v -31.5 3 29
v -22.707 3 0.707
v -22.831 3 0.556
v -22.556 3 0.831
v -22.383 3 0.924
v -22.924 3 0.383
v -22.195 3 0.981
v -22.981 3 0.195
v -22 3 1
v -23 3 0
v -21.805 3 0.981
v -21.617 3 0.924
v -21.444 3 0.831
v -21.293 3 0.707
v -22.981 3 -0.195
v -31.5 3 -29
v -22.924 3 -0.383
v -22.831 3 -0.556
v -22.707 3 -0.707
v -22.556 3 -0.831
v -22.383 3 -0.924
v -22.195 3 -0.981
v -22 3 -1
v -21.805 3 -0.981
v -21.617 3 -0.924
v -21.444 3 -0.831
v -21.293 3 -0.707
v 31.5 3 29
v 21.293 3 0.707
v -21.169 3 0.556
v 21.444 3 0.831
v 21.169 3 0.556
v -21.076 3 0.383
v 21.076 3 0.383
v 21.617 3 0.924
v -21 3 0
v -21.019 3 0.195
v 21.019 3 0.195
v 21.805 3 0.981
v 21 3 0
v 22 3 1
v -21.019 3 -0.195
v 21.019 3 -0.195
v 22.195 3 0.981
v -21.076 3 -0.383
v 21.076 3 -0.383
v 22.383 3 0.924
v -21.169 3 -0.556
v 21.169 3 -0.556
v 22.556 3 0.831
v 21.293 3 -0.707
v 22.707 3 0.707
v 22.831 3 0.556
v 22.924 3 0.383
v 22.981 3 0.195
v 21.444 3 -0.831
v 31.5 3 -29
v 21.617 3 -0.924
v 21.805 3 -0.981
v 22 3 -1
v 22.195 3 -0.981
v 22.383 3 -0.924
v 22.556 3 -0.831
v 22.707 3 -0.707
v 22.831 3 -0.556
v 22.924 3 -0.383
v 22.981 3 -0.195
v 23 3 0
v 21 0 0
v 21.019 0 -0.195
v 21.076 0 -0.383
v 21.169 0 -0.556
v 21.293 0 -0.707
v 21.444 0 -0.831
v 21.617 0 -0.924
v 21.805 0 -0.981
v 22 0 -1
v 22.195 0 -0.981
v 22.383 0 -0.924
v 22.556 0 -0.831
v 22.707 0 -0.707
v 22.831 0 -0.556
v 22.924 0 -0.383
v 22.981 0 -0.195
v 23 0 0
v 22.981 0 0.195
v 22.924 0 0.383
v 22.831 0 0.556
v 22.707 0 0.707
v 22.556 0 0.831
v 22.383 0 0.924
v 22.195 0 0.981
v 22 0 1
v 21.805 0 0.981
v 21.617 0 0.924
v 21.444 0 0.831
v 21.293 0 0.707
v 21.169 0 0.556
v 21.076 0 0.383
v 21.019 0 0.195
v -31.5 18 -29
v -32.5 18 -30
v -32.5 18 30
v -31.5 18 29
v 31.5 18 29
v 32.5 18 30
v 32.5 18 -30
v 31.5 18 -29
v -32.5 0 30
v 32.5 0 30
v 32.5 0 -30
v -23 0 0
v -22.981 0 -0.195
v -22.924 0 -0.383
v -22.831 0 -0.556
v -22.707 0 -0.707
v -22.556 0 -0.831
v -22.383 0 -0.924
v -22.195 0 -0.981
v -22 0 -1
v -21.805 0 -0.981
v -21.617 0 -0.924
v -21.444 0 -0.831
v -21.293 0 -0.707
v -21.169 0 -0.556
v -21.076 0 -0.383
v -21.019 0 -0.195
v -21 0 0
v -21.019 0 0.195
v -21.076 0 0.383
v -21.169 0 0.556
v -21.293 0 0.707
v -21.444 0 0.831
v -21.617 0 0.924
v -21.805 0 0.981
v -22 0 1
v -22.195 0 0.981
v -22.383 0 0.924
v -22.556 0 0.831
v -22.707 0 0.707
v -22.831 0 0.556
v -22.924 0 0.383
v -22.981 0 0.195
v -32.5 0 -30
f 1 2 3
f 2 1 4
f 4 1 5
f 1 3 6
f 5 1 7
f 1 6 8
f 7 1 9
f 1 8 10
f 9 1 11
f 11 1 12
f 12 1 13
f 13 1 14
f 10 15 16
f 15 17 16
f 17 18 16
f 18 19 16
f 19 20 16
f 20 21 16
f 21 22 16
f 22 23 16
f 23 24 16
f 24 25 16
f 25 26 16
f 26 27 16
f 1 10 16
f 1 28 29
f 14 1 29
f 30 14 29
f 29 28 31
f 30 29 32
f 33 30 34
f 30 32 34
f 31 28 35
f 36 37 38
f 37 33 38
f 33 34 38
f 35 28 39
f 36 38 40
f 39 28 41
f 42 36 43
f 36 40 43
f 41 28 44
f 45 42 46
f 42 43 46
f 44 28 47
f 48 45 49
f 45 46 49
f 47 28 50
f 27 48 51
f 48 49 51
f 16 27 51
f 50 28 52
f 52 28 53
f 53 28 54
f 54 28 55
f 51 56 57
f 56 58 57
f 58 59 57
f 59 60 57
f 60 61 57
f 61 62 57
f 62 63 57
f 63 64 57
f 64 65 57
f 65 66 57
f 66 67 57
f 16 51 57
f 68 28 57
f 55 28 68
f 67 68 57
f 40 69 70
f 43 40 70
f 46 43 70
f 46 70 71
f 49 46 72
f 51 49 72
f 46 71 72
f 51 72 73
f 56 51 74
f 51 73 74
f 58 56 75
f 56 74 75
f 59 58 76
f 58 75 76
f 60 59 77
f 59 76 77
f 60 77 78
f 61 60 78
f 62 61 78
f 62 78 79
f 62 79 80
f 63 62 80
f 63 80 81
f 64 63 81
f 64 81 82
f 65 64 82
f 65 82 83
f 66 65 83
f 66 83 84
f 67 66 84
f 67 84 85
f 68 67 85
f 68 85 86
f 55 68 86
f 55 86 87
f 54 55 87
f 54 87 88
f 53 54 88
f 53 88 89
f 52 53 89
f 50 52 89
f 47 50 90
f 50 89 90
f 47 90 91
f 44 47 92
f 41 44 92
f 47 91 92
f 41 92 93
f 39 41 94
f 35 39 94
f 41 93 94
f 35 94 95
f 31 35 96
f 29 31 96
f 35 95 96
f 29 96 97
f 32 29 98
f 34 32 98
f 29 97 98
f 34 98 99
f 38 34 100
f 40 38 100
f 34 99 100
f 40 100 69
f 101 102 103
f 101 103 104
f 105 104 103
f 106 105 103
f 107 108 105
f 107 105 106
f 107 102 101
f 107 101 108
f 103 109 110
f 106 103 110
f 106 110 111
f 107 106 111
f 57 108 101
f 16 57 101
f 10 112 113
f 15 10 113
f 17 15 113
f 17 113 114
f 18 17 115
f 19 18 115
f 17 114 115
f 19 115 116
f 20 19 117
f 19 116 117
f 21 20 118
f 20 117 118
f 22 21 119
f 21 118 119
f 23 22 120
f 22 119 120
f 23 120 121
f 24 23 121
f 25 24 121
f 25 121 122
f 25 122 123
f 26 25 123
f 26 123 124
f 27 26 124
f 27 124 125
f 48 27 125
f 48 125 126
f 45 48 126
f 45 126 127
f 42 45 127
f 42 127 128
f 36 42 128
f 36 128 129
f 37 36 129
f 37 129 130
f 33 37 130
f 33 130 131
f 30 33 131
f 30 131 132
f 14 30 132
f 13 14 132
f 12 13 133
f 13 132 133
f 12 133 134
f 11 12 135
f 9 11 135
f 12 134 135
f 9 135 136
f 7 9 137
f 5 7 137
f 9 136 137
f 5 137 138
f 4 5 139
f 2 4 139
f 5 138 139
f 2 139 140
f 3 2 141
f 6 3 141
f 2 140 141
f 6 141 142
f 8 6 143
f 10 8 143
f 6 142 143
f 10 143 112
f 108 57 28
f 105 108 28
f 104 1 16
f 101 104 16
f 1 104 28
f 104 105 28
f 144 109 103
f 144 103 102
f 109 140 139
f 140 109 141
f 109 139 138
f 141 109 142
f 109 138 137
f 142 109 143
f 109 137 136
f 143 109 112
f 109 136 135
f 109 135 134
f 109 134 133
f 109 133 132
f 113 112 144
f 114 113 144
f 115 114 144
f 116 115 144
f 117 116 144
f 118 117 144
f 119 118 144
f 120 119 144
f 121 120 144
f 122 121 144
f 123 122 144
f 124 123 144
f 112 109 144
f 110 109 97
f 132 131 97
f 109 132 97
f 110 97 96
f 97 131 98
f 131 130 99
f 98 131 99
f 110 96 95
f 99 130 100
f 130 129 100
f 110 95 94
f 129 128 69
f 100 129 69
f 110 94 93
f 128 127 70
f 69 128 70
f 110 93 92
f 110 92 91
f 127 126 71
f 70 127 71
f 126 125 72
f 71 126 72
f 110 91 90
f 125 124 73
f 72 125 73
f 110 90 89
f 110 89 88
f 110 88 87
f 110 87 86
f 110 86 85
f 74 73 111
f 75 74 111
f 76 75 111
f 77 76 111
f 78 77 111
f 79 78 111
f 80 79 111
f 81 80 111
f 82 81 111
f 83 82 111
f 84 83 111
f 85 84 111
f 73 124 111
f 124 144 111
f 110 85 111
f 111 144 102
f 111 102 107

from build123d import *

# Parameters (mm, degrees)
SKETCH1_W                 = 65
SKETCH1_H                 = 60
BOSS_EXTRUDE1_DEPTH       = 18
SHELL1_T                  = -3
SHELL1_THICKNESS_2_FACE_W = 59
SHELL1_THICKNESS_2_FACE_H = 15
SHELL1_THICKNESS_2_DEPTH  = 2
SHELL1_THICKNESS_3_FACE_W = 56
SHELL1_THICKNESS_3_FACE_H = 15
SHELL1_THICKNESS_3_DEPTH  = 2
SHELL1_THICKNESS_4_FACE_W = 56
SHELL1_THICKNESS_4_FACE_H = 15
SHELL1_THICKNESS_4_DEPTH  = 2
SHELL1_THICKNESS_5_FACE_W = 63
SHELL1_THICKNESS_5_FACE_H = 15
SHELL1_THICKNESS_5_DEPTH  = 2
F_2_0MM_DOWEL_HOLE1_D     = 2


with BuildPart() as part:
    # Sketch1 → Boss-Extrude1 (new body)
    with BuildSketch(Plane(origin=(0, 0, 0), x_dir=(1, 0, 0), z_dir=(0, 1, 0))):
        Rectangle(SKETCH1_W, SKETCH1_H)
    extrude(amount=BOSS_EXTRUDE1_DEPTH)

    # Shell1
    shell1_openings = [part.faces().sort_by_distance(p)[0] for p in [
        (0, 18, 0),
    ]]
    offset(amount=SHELL1_T, openings=shell1_openings, kind=Kind.INTERSECTION)

    # Shell1 thickness 2 face (on inner face of the shell) → Shell1 thickness 2 (cut)
    with BuildSketch(Plane(origin=(0, 10.5, 27), x_dir=(1, 0, 0), z_dir=(0, 0, 1))):
        Rectangle(SHELL1_THICKNESS_2_FACE_W, SHELL1_THICKNESS_2_FACE_H)
    extrude(amount=SHELL1_THICKNESS_2_DEPTH, mode=Mode.SUBTRACT)

    # Shell1 thickness 3 face (on inner face of the shell) → Shell1 thickness 3 (cut)
    with BuildSketch(Plane(origin=(29.5, 10.5, 1), x_dir=(0, 0, 1), z_dir=(1, 0, 0))):
        Rectangle(SHELL1_THICKNESS_3_FACE_W, SHELL1_THICKNESS_3_FACE_H)
    extrude(amount=SHELL1_THICKNESS_3_DEPTH, mode=Mode.SUBTRACT)

    # Shell1 thickness 4 face (on inner face of the shell) → Shell1 thickness 4 (cut)
    with BuildSketch(Plane(origin=(-29.5, 10.5, 1), x_dir=(0, 0, -1), z_dir=(-1, 0, 0))):
        Rectangle(SHELL1_THICKNESS_4_FACE_W, SHELL1_THICKNESS_4_FACE_H)
    extrude(amount=SHELL1_THICKNESS_4_DEPTH, mode=Mode.SUBTRACT)

    # Shell1 thickness 5 face (on inner face of the shell) → Shell1 thickness 5 (cut)
    with BuildSketch(Plane(origin=(0, 10.5, -27), x_dir=(-1, 0, 0), z_dir=(0, 0, -1))):
        Rectangle(SHELL1_THICKNESS_5_FACE_W, SHELL1_THICKNESS_5_FACE_H)
    extrude(amount=SHELL1_THICKNESS_5_DEPTH, mode=Mode.SUBTRACT)

    # Ø2.0mm Dowel Hole1 (through all)
    with Locations(Plane(origin=(0, 3, 0), x_dir=(1, 0, 0), z_dir=(0, 1, 0))):
        with Locations((-22, 0), (22, 0)):
            Hole(F_2_0MM_DOWEL_HOLE1_D / 2)


solid = part.part
